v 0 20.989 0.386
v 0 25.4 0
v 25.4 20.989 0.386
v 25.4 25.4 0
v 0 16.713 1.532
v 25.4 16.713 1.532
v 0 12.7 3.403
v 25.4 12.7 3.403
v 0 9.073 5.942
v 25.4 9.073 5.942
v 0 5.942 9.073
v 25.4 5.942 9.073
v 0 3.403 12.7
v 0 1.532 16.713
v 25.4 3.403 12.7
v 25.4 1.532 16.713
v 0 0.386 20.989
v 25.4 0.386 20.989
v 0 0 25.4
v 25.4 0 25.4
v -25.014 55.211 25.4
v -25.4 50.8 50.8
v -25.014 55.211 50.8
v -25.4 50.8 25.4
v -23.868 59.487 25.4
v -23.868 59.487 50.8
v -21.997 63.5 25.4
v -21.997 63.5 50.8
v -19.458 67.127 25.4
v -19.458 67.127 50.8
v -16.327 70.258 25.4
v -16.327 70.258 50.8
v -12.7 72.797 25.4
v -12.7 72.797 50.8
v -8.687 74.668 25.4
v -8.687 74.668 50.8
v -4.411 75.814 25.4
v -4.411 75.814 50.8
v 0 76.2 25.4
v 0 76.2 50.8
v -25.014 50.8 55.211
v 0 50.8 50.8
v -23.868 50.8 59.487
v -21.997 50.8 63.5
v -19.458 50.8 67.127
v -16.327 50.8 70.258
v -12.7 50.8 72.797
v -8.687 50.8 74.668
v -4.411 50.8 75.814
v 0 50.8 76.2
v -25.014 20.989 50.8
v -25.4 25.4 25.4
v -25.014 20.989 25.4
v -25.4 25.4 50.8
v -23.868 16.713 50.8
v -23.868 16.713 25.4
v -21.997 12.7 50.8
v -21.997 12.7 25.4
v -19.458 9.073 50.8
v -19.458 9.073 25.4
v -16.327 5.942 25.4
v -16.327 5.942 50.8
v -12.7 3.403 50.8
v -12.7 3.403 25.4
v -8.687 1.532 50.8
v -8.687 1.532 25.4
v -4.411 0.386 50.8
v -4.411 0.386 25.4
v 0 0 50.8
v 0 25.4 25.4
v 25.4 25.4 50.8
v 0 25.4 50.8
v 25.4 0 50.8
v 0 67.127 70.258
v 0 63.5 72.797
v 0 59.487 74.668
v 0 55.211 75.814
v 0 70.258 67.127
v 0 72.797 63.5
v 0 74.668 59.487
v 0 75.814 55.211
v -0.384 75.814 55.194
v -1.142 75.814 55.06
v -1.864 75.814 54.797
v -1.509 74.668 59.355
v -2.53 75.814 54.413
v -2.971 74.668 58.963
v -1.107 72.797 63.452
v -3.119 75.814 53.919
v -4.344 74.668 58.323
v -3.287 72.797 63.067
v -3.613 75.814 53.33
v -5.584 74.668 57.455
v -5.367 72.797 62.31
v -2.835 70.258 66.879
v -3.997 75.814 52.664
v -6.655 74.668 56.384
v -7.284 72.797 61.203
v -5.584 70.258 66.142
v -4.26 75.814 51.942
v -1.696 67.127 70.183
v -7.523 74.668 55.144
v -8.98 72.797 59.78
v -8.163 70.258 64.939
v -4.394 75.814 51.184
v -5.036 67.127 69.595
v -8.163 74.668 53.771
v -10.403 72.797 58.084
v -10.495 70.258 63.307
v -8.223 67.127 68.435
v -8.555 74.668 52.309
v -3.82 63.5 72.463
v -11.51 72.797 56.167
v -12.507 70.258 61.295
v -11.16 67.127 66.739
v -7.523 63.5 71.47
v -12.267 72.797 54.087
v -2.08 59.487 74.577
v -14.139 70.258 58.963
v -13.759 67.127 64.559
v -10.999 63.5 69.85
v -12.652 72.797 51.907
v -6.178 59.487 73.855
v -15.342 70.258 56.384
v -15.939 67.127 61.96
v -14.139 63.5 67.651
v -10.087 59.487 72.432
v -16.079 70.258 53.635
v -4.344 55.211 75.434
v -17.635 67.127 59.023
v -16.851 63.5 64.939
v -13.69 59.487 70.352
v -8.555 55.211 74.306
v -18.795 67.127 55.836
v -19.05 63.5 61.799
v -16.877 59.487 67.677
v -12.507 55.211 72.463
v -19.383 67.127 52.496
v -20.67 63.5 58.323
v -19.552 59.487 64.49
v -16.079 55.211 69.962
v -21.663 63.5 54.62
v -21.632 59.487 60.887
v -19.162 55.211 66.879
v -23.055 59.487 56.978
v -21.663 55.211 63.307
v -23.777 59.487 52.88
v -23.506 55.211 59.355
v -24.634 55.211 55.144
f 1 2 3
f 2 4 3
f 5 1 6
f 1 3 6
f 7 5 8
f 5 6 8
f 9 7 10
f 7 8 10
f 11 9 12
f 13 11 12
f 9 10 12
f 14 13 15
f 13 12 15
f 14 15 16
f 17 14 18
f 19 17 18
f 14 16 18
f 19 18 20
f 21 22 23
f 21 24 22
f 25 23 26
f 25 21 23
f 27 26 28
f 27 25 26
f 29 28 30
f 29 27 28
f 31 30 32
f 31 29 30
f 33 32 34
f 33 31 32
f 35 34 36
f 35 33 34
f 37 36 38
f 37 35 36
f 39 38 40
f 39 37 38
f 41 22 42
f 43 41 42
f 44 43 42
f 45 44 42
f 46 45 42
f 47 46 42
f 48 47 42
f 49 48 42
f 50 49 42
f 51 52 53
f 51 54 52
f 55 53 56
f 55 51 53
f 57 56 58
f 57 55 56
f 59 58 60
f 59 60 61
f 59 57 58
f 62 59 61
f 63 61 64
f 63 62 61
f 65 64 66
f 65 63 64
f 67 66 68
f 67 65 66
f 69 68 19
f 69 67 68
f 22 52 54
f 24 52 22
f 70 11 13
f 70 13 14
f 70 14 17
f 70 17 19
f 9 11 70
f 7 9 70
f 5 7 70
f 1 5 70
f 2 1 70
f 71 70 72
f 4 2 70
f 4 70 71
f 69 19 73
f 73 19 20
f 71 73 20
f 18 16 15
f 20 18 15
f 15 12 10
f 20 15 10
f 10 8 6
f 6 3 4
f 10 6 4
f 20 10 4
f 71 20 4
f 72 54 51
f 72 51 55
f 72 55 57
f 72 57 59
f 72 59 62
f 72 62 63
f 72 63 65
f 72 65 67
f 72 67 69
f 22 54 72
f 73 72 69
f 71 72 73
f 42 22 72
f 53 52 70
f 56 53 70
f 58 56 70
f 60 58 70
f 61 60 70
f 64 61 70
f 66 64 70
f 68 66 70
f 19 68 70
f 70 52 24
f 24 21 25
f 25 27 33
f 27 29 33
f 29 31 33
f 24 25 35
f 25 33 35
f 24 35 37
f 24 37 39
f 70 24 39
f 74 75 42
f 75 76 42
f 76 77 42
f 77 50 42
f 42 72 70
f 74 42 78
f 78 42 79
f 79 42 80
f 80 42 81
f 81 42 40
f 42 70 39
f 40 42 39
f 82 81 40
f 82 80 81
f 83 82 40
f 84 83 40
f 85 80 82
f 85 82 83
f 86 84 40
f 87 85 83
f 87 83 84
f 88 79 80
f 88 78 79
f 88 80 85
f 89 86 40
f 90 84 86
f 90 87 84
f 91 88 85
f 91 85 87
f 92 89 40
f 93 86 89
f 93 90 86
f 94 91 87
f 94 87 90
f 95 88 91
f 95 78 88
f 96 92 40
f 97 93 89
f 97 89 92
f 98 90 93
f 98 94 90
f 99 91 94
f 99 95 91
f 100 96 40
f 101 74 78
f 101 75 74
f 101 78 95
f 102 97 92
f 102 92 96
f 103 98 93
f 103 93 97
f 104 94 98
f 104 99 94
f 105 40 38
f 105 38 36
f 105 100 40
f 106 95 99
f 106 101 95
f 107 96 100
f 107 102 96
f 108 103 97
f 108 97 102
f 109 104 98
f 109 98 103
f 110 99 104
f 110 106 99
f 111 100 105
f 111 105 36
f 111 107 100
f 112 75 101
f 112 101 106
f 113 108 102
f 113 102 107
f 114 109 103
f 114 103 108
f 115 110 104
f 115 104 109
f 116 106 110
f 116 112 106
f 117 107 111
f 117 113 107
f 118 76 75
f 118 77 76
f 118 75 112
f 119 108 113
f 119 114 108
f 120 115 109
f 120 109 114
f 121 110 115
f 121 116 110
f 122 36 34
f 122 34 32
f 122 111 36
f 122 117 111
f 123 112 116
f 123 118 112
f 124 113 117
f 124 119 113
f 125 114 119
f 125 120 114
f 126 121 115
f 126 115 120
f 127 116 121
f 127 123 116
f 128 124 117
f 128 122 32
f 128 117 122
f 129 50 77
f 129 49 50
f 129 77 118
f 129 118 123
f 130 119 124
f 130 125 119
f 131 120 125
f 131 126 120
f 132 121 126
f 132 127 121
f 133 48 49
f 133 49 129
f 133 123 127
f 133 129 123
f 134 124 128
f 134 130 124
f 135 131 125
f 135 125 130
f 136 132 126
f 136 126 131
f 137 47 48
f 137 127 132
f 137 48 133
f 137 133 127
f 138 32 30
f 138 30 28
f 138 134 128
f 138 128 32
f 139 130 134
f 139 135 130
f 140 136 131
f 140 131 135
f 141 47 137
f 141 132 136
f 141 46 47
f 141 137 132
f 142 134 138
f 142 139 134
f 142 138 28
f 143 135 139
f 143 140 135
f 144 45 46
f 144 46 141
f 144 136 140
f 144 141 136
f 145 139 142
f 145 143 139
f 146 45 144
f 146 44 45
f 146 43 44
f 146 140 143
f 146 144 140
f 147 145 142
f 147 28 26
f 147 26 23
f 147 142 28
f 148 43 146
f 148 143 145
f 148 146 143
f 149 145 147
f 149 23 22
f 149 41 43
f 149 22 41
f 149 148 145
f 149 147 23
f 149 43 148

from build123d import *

# Parameters (mm, degrees)
F0_W     = 25.4
F0_H     = 25.4
F1_DEPTH = 25.4
F2_W     = 25.4
F2_H     = 25.4
F3_DEPTH = 25.4
F4_W     = 25.4
F4_H     = 25.4
F5_DEPTH = 25.4
F6_R     = 25.39999


# Not quite as in the source:
# - a fillet or chamfer is up to 0.001 mm smaller than in the source, because OpenCascade refuses the exact size


with BuildPart() as f1:
    # F0 (on Top) → F1 (new body)
    with BuildSketch(Plane.XY):
        with Locations((12.7, 12.7)):
            Rectangle(F0_W, F0_H)
    extrude(amount=F1_DEPTH)

    # F2 (on face) → F3 (join)
    with BuildSketch(Plane.XY.offset(25.4)):
        Polygon((-25.4, 0), (0, 0), (0, 25.4), (0, 76.2), (-25.4, 76.2), align=None)
        with Locations((12.7, 12.7)):
            Rectangle(F2_W, F2_H)
    extrude(amount=F3_DEPTH)

    # F4 (on face) → F5 (join)
    with BuildSketch(Plane.XY.offset(50.8)):
        with Locations((-12.7, 63.5)):
            Rectangle(F4_W, F4_H)
    extrude(amount=F5_DEPTH)

    # F6 (radius 25.4 in the source; OpenCascade refuses exactly that, so slightly less here)
    f6_edges = [f1.edges().sort_by_distance(p)[0] for p in [
        (12.7, 0, 0),
        (-25.4, 0, 38.1),
        (-25.4, 63.5, 76.2),
        (-12.7, 76.2, 76.2),
        (-25.4, 76.2, 50.8),
    ]]
    fillet(f6_edges, radius=F6_R)


solid = f1.part
